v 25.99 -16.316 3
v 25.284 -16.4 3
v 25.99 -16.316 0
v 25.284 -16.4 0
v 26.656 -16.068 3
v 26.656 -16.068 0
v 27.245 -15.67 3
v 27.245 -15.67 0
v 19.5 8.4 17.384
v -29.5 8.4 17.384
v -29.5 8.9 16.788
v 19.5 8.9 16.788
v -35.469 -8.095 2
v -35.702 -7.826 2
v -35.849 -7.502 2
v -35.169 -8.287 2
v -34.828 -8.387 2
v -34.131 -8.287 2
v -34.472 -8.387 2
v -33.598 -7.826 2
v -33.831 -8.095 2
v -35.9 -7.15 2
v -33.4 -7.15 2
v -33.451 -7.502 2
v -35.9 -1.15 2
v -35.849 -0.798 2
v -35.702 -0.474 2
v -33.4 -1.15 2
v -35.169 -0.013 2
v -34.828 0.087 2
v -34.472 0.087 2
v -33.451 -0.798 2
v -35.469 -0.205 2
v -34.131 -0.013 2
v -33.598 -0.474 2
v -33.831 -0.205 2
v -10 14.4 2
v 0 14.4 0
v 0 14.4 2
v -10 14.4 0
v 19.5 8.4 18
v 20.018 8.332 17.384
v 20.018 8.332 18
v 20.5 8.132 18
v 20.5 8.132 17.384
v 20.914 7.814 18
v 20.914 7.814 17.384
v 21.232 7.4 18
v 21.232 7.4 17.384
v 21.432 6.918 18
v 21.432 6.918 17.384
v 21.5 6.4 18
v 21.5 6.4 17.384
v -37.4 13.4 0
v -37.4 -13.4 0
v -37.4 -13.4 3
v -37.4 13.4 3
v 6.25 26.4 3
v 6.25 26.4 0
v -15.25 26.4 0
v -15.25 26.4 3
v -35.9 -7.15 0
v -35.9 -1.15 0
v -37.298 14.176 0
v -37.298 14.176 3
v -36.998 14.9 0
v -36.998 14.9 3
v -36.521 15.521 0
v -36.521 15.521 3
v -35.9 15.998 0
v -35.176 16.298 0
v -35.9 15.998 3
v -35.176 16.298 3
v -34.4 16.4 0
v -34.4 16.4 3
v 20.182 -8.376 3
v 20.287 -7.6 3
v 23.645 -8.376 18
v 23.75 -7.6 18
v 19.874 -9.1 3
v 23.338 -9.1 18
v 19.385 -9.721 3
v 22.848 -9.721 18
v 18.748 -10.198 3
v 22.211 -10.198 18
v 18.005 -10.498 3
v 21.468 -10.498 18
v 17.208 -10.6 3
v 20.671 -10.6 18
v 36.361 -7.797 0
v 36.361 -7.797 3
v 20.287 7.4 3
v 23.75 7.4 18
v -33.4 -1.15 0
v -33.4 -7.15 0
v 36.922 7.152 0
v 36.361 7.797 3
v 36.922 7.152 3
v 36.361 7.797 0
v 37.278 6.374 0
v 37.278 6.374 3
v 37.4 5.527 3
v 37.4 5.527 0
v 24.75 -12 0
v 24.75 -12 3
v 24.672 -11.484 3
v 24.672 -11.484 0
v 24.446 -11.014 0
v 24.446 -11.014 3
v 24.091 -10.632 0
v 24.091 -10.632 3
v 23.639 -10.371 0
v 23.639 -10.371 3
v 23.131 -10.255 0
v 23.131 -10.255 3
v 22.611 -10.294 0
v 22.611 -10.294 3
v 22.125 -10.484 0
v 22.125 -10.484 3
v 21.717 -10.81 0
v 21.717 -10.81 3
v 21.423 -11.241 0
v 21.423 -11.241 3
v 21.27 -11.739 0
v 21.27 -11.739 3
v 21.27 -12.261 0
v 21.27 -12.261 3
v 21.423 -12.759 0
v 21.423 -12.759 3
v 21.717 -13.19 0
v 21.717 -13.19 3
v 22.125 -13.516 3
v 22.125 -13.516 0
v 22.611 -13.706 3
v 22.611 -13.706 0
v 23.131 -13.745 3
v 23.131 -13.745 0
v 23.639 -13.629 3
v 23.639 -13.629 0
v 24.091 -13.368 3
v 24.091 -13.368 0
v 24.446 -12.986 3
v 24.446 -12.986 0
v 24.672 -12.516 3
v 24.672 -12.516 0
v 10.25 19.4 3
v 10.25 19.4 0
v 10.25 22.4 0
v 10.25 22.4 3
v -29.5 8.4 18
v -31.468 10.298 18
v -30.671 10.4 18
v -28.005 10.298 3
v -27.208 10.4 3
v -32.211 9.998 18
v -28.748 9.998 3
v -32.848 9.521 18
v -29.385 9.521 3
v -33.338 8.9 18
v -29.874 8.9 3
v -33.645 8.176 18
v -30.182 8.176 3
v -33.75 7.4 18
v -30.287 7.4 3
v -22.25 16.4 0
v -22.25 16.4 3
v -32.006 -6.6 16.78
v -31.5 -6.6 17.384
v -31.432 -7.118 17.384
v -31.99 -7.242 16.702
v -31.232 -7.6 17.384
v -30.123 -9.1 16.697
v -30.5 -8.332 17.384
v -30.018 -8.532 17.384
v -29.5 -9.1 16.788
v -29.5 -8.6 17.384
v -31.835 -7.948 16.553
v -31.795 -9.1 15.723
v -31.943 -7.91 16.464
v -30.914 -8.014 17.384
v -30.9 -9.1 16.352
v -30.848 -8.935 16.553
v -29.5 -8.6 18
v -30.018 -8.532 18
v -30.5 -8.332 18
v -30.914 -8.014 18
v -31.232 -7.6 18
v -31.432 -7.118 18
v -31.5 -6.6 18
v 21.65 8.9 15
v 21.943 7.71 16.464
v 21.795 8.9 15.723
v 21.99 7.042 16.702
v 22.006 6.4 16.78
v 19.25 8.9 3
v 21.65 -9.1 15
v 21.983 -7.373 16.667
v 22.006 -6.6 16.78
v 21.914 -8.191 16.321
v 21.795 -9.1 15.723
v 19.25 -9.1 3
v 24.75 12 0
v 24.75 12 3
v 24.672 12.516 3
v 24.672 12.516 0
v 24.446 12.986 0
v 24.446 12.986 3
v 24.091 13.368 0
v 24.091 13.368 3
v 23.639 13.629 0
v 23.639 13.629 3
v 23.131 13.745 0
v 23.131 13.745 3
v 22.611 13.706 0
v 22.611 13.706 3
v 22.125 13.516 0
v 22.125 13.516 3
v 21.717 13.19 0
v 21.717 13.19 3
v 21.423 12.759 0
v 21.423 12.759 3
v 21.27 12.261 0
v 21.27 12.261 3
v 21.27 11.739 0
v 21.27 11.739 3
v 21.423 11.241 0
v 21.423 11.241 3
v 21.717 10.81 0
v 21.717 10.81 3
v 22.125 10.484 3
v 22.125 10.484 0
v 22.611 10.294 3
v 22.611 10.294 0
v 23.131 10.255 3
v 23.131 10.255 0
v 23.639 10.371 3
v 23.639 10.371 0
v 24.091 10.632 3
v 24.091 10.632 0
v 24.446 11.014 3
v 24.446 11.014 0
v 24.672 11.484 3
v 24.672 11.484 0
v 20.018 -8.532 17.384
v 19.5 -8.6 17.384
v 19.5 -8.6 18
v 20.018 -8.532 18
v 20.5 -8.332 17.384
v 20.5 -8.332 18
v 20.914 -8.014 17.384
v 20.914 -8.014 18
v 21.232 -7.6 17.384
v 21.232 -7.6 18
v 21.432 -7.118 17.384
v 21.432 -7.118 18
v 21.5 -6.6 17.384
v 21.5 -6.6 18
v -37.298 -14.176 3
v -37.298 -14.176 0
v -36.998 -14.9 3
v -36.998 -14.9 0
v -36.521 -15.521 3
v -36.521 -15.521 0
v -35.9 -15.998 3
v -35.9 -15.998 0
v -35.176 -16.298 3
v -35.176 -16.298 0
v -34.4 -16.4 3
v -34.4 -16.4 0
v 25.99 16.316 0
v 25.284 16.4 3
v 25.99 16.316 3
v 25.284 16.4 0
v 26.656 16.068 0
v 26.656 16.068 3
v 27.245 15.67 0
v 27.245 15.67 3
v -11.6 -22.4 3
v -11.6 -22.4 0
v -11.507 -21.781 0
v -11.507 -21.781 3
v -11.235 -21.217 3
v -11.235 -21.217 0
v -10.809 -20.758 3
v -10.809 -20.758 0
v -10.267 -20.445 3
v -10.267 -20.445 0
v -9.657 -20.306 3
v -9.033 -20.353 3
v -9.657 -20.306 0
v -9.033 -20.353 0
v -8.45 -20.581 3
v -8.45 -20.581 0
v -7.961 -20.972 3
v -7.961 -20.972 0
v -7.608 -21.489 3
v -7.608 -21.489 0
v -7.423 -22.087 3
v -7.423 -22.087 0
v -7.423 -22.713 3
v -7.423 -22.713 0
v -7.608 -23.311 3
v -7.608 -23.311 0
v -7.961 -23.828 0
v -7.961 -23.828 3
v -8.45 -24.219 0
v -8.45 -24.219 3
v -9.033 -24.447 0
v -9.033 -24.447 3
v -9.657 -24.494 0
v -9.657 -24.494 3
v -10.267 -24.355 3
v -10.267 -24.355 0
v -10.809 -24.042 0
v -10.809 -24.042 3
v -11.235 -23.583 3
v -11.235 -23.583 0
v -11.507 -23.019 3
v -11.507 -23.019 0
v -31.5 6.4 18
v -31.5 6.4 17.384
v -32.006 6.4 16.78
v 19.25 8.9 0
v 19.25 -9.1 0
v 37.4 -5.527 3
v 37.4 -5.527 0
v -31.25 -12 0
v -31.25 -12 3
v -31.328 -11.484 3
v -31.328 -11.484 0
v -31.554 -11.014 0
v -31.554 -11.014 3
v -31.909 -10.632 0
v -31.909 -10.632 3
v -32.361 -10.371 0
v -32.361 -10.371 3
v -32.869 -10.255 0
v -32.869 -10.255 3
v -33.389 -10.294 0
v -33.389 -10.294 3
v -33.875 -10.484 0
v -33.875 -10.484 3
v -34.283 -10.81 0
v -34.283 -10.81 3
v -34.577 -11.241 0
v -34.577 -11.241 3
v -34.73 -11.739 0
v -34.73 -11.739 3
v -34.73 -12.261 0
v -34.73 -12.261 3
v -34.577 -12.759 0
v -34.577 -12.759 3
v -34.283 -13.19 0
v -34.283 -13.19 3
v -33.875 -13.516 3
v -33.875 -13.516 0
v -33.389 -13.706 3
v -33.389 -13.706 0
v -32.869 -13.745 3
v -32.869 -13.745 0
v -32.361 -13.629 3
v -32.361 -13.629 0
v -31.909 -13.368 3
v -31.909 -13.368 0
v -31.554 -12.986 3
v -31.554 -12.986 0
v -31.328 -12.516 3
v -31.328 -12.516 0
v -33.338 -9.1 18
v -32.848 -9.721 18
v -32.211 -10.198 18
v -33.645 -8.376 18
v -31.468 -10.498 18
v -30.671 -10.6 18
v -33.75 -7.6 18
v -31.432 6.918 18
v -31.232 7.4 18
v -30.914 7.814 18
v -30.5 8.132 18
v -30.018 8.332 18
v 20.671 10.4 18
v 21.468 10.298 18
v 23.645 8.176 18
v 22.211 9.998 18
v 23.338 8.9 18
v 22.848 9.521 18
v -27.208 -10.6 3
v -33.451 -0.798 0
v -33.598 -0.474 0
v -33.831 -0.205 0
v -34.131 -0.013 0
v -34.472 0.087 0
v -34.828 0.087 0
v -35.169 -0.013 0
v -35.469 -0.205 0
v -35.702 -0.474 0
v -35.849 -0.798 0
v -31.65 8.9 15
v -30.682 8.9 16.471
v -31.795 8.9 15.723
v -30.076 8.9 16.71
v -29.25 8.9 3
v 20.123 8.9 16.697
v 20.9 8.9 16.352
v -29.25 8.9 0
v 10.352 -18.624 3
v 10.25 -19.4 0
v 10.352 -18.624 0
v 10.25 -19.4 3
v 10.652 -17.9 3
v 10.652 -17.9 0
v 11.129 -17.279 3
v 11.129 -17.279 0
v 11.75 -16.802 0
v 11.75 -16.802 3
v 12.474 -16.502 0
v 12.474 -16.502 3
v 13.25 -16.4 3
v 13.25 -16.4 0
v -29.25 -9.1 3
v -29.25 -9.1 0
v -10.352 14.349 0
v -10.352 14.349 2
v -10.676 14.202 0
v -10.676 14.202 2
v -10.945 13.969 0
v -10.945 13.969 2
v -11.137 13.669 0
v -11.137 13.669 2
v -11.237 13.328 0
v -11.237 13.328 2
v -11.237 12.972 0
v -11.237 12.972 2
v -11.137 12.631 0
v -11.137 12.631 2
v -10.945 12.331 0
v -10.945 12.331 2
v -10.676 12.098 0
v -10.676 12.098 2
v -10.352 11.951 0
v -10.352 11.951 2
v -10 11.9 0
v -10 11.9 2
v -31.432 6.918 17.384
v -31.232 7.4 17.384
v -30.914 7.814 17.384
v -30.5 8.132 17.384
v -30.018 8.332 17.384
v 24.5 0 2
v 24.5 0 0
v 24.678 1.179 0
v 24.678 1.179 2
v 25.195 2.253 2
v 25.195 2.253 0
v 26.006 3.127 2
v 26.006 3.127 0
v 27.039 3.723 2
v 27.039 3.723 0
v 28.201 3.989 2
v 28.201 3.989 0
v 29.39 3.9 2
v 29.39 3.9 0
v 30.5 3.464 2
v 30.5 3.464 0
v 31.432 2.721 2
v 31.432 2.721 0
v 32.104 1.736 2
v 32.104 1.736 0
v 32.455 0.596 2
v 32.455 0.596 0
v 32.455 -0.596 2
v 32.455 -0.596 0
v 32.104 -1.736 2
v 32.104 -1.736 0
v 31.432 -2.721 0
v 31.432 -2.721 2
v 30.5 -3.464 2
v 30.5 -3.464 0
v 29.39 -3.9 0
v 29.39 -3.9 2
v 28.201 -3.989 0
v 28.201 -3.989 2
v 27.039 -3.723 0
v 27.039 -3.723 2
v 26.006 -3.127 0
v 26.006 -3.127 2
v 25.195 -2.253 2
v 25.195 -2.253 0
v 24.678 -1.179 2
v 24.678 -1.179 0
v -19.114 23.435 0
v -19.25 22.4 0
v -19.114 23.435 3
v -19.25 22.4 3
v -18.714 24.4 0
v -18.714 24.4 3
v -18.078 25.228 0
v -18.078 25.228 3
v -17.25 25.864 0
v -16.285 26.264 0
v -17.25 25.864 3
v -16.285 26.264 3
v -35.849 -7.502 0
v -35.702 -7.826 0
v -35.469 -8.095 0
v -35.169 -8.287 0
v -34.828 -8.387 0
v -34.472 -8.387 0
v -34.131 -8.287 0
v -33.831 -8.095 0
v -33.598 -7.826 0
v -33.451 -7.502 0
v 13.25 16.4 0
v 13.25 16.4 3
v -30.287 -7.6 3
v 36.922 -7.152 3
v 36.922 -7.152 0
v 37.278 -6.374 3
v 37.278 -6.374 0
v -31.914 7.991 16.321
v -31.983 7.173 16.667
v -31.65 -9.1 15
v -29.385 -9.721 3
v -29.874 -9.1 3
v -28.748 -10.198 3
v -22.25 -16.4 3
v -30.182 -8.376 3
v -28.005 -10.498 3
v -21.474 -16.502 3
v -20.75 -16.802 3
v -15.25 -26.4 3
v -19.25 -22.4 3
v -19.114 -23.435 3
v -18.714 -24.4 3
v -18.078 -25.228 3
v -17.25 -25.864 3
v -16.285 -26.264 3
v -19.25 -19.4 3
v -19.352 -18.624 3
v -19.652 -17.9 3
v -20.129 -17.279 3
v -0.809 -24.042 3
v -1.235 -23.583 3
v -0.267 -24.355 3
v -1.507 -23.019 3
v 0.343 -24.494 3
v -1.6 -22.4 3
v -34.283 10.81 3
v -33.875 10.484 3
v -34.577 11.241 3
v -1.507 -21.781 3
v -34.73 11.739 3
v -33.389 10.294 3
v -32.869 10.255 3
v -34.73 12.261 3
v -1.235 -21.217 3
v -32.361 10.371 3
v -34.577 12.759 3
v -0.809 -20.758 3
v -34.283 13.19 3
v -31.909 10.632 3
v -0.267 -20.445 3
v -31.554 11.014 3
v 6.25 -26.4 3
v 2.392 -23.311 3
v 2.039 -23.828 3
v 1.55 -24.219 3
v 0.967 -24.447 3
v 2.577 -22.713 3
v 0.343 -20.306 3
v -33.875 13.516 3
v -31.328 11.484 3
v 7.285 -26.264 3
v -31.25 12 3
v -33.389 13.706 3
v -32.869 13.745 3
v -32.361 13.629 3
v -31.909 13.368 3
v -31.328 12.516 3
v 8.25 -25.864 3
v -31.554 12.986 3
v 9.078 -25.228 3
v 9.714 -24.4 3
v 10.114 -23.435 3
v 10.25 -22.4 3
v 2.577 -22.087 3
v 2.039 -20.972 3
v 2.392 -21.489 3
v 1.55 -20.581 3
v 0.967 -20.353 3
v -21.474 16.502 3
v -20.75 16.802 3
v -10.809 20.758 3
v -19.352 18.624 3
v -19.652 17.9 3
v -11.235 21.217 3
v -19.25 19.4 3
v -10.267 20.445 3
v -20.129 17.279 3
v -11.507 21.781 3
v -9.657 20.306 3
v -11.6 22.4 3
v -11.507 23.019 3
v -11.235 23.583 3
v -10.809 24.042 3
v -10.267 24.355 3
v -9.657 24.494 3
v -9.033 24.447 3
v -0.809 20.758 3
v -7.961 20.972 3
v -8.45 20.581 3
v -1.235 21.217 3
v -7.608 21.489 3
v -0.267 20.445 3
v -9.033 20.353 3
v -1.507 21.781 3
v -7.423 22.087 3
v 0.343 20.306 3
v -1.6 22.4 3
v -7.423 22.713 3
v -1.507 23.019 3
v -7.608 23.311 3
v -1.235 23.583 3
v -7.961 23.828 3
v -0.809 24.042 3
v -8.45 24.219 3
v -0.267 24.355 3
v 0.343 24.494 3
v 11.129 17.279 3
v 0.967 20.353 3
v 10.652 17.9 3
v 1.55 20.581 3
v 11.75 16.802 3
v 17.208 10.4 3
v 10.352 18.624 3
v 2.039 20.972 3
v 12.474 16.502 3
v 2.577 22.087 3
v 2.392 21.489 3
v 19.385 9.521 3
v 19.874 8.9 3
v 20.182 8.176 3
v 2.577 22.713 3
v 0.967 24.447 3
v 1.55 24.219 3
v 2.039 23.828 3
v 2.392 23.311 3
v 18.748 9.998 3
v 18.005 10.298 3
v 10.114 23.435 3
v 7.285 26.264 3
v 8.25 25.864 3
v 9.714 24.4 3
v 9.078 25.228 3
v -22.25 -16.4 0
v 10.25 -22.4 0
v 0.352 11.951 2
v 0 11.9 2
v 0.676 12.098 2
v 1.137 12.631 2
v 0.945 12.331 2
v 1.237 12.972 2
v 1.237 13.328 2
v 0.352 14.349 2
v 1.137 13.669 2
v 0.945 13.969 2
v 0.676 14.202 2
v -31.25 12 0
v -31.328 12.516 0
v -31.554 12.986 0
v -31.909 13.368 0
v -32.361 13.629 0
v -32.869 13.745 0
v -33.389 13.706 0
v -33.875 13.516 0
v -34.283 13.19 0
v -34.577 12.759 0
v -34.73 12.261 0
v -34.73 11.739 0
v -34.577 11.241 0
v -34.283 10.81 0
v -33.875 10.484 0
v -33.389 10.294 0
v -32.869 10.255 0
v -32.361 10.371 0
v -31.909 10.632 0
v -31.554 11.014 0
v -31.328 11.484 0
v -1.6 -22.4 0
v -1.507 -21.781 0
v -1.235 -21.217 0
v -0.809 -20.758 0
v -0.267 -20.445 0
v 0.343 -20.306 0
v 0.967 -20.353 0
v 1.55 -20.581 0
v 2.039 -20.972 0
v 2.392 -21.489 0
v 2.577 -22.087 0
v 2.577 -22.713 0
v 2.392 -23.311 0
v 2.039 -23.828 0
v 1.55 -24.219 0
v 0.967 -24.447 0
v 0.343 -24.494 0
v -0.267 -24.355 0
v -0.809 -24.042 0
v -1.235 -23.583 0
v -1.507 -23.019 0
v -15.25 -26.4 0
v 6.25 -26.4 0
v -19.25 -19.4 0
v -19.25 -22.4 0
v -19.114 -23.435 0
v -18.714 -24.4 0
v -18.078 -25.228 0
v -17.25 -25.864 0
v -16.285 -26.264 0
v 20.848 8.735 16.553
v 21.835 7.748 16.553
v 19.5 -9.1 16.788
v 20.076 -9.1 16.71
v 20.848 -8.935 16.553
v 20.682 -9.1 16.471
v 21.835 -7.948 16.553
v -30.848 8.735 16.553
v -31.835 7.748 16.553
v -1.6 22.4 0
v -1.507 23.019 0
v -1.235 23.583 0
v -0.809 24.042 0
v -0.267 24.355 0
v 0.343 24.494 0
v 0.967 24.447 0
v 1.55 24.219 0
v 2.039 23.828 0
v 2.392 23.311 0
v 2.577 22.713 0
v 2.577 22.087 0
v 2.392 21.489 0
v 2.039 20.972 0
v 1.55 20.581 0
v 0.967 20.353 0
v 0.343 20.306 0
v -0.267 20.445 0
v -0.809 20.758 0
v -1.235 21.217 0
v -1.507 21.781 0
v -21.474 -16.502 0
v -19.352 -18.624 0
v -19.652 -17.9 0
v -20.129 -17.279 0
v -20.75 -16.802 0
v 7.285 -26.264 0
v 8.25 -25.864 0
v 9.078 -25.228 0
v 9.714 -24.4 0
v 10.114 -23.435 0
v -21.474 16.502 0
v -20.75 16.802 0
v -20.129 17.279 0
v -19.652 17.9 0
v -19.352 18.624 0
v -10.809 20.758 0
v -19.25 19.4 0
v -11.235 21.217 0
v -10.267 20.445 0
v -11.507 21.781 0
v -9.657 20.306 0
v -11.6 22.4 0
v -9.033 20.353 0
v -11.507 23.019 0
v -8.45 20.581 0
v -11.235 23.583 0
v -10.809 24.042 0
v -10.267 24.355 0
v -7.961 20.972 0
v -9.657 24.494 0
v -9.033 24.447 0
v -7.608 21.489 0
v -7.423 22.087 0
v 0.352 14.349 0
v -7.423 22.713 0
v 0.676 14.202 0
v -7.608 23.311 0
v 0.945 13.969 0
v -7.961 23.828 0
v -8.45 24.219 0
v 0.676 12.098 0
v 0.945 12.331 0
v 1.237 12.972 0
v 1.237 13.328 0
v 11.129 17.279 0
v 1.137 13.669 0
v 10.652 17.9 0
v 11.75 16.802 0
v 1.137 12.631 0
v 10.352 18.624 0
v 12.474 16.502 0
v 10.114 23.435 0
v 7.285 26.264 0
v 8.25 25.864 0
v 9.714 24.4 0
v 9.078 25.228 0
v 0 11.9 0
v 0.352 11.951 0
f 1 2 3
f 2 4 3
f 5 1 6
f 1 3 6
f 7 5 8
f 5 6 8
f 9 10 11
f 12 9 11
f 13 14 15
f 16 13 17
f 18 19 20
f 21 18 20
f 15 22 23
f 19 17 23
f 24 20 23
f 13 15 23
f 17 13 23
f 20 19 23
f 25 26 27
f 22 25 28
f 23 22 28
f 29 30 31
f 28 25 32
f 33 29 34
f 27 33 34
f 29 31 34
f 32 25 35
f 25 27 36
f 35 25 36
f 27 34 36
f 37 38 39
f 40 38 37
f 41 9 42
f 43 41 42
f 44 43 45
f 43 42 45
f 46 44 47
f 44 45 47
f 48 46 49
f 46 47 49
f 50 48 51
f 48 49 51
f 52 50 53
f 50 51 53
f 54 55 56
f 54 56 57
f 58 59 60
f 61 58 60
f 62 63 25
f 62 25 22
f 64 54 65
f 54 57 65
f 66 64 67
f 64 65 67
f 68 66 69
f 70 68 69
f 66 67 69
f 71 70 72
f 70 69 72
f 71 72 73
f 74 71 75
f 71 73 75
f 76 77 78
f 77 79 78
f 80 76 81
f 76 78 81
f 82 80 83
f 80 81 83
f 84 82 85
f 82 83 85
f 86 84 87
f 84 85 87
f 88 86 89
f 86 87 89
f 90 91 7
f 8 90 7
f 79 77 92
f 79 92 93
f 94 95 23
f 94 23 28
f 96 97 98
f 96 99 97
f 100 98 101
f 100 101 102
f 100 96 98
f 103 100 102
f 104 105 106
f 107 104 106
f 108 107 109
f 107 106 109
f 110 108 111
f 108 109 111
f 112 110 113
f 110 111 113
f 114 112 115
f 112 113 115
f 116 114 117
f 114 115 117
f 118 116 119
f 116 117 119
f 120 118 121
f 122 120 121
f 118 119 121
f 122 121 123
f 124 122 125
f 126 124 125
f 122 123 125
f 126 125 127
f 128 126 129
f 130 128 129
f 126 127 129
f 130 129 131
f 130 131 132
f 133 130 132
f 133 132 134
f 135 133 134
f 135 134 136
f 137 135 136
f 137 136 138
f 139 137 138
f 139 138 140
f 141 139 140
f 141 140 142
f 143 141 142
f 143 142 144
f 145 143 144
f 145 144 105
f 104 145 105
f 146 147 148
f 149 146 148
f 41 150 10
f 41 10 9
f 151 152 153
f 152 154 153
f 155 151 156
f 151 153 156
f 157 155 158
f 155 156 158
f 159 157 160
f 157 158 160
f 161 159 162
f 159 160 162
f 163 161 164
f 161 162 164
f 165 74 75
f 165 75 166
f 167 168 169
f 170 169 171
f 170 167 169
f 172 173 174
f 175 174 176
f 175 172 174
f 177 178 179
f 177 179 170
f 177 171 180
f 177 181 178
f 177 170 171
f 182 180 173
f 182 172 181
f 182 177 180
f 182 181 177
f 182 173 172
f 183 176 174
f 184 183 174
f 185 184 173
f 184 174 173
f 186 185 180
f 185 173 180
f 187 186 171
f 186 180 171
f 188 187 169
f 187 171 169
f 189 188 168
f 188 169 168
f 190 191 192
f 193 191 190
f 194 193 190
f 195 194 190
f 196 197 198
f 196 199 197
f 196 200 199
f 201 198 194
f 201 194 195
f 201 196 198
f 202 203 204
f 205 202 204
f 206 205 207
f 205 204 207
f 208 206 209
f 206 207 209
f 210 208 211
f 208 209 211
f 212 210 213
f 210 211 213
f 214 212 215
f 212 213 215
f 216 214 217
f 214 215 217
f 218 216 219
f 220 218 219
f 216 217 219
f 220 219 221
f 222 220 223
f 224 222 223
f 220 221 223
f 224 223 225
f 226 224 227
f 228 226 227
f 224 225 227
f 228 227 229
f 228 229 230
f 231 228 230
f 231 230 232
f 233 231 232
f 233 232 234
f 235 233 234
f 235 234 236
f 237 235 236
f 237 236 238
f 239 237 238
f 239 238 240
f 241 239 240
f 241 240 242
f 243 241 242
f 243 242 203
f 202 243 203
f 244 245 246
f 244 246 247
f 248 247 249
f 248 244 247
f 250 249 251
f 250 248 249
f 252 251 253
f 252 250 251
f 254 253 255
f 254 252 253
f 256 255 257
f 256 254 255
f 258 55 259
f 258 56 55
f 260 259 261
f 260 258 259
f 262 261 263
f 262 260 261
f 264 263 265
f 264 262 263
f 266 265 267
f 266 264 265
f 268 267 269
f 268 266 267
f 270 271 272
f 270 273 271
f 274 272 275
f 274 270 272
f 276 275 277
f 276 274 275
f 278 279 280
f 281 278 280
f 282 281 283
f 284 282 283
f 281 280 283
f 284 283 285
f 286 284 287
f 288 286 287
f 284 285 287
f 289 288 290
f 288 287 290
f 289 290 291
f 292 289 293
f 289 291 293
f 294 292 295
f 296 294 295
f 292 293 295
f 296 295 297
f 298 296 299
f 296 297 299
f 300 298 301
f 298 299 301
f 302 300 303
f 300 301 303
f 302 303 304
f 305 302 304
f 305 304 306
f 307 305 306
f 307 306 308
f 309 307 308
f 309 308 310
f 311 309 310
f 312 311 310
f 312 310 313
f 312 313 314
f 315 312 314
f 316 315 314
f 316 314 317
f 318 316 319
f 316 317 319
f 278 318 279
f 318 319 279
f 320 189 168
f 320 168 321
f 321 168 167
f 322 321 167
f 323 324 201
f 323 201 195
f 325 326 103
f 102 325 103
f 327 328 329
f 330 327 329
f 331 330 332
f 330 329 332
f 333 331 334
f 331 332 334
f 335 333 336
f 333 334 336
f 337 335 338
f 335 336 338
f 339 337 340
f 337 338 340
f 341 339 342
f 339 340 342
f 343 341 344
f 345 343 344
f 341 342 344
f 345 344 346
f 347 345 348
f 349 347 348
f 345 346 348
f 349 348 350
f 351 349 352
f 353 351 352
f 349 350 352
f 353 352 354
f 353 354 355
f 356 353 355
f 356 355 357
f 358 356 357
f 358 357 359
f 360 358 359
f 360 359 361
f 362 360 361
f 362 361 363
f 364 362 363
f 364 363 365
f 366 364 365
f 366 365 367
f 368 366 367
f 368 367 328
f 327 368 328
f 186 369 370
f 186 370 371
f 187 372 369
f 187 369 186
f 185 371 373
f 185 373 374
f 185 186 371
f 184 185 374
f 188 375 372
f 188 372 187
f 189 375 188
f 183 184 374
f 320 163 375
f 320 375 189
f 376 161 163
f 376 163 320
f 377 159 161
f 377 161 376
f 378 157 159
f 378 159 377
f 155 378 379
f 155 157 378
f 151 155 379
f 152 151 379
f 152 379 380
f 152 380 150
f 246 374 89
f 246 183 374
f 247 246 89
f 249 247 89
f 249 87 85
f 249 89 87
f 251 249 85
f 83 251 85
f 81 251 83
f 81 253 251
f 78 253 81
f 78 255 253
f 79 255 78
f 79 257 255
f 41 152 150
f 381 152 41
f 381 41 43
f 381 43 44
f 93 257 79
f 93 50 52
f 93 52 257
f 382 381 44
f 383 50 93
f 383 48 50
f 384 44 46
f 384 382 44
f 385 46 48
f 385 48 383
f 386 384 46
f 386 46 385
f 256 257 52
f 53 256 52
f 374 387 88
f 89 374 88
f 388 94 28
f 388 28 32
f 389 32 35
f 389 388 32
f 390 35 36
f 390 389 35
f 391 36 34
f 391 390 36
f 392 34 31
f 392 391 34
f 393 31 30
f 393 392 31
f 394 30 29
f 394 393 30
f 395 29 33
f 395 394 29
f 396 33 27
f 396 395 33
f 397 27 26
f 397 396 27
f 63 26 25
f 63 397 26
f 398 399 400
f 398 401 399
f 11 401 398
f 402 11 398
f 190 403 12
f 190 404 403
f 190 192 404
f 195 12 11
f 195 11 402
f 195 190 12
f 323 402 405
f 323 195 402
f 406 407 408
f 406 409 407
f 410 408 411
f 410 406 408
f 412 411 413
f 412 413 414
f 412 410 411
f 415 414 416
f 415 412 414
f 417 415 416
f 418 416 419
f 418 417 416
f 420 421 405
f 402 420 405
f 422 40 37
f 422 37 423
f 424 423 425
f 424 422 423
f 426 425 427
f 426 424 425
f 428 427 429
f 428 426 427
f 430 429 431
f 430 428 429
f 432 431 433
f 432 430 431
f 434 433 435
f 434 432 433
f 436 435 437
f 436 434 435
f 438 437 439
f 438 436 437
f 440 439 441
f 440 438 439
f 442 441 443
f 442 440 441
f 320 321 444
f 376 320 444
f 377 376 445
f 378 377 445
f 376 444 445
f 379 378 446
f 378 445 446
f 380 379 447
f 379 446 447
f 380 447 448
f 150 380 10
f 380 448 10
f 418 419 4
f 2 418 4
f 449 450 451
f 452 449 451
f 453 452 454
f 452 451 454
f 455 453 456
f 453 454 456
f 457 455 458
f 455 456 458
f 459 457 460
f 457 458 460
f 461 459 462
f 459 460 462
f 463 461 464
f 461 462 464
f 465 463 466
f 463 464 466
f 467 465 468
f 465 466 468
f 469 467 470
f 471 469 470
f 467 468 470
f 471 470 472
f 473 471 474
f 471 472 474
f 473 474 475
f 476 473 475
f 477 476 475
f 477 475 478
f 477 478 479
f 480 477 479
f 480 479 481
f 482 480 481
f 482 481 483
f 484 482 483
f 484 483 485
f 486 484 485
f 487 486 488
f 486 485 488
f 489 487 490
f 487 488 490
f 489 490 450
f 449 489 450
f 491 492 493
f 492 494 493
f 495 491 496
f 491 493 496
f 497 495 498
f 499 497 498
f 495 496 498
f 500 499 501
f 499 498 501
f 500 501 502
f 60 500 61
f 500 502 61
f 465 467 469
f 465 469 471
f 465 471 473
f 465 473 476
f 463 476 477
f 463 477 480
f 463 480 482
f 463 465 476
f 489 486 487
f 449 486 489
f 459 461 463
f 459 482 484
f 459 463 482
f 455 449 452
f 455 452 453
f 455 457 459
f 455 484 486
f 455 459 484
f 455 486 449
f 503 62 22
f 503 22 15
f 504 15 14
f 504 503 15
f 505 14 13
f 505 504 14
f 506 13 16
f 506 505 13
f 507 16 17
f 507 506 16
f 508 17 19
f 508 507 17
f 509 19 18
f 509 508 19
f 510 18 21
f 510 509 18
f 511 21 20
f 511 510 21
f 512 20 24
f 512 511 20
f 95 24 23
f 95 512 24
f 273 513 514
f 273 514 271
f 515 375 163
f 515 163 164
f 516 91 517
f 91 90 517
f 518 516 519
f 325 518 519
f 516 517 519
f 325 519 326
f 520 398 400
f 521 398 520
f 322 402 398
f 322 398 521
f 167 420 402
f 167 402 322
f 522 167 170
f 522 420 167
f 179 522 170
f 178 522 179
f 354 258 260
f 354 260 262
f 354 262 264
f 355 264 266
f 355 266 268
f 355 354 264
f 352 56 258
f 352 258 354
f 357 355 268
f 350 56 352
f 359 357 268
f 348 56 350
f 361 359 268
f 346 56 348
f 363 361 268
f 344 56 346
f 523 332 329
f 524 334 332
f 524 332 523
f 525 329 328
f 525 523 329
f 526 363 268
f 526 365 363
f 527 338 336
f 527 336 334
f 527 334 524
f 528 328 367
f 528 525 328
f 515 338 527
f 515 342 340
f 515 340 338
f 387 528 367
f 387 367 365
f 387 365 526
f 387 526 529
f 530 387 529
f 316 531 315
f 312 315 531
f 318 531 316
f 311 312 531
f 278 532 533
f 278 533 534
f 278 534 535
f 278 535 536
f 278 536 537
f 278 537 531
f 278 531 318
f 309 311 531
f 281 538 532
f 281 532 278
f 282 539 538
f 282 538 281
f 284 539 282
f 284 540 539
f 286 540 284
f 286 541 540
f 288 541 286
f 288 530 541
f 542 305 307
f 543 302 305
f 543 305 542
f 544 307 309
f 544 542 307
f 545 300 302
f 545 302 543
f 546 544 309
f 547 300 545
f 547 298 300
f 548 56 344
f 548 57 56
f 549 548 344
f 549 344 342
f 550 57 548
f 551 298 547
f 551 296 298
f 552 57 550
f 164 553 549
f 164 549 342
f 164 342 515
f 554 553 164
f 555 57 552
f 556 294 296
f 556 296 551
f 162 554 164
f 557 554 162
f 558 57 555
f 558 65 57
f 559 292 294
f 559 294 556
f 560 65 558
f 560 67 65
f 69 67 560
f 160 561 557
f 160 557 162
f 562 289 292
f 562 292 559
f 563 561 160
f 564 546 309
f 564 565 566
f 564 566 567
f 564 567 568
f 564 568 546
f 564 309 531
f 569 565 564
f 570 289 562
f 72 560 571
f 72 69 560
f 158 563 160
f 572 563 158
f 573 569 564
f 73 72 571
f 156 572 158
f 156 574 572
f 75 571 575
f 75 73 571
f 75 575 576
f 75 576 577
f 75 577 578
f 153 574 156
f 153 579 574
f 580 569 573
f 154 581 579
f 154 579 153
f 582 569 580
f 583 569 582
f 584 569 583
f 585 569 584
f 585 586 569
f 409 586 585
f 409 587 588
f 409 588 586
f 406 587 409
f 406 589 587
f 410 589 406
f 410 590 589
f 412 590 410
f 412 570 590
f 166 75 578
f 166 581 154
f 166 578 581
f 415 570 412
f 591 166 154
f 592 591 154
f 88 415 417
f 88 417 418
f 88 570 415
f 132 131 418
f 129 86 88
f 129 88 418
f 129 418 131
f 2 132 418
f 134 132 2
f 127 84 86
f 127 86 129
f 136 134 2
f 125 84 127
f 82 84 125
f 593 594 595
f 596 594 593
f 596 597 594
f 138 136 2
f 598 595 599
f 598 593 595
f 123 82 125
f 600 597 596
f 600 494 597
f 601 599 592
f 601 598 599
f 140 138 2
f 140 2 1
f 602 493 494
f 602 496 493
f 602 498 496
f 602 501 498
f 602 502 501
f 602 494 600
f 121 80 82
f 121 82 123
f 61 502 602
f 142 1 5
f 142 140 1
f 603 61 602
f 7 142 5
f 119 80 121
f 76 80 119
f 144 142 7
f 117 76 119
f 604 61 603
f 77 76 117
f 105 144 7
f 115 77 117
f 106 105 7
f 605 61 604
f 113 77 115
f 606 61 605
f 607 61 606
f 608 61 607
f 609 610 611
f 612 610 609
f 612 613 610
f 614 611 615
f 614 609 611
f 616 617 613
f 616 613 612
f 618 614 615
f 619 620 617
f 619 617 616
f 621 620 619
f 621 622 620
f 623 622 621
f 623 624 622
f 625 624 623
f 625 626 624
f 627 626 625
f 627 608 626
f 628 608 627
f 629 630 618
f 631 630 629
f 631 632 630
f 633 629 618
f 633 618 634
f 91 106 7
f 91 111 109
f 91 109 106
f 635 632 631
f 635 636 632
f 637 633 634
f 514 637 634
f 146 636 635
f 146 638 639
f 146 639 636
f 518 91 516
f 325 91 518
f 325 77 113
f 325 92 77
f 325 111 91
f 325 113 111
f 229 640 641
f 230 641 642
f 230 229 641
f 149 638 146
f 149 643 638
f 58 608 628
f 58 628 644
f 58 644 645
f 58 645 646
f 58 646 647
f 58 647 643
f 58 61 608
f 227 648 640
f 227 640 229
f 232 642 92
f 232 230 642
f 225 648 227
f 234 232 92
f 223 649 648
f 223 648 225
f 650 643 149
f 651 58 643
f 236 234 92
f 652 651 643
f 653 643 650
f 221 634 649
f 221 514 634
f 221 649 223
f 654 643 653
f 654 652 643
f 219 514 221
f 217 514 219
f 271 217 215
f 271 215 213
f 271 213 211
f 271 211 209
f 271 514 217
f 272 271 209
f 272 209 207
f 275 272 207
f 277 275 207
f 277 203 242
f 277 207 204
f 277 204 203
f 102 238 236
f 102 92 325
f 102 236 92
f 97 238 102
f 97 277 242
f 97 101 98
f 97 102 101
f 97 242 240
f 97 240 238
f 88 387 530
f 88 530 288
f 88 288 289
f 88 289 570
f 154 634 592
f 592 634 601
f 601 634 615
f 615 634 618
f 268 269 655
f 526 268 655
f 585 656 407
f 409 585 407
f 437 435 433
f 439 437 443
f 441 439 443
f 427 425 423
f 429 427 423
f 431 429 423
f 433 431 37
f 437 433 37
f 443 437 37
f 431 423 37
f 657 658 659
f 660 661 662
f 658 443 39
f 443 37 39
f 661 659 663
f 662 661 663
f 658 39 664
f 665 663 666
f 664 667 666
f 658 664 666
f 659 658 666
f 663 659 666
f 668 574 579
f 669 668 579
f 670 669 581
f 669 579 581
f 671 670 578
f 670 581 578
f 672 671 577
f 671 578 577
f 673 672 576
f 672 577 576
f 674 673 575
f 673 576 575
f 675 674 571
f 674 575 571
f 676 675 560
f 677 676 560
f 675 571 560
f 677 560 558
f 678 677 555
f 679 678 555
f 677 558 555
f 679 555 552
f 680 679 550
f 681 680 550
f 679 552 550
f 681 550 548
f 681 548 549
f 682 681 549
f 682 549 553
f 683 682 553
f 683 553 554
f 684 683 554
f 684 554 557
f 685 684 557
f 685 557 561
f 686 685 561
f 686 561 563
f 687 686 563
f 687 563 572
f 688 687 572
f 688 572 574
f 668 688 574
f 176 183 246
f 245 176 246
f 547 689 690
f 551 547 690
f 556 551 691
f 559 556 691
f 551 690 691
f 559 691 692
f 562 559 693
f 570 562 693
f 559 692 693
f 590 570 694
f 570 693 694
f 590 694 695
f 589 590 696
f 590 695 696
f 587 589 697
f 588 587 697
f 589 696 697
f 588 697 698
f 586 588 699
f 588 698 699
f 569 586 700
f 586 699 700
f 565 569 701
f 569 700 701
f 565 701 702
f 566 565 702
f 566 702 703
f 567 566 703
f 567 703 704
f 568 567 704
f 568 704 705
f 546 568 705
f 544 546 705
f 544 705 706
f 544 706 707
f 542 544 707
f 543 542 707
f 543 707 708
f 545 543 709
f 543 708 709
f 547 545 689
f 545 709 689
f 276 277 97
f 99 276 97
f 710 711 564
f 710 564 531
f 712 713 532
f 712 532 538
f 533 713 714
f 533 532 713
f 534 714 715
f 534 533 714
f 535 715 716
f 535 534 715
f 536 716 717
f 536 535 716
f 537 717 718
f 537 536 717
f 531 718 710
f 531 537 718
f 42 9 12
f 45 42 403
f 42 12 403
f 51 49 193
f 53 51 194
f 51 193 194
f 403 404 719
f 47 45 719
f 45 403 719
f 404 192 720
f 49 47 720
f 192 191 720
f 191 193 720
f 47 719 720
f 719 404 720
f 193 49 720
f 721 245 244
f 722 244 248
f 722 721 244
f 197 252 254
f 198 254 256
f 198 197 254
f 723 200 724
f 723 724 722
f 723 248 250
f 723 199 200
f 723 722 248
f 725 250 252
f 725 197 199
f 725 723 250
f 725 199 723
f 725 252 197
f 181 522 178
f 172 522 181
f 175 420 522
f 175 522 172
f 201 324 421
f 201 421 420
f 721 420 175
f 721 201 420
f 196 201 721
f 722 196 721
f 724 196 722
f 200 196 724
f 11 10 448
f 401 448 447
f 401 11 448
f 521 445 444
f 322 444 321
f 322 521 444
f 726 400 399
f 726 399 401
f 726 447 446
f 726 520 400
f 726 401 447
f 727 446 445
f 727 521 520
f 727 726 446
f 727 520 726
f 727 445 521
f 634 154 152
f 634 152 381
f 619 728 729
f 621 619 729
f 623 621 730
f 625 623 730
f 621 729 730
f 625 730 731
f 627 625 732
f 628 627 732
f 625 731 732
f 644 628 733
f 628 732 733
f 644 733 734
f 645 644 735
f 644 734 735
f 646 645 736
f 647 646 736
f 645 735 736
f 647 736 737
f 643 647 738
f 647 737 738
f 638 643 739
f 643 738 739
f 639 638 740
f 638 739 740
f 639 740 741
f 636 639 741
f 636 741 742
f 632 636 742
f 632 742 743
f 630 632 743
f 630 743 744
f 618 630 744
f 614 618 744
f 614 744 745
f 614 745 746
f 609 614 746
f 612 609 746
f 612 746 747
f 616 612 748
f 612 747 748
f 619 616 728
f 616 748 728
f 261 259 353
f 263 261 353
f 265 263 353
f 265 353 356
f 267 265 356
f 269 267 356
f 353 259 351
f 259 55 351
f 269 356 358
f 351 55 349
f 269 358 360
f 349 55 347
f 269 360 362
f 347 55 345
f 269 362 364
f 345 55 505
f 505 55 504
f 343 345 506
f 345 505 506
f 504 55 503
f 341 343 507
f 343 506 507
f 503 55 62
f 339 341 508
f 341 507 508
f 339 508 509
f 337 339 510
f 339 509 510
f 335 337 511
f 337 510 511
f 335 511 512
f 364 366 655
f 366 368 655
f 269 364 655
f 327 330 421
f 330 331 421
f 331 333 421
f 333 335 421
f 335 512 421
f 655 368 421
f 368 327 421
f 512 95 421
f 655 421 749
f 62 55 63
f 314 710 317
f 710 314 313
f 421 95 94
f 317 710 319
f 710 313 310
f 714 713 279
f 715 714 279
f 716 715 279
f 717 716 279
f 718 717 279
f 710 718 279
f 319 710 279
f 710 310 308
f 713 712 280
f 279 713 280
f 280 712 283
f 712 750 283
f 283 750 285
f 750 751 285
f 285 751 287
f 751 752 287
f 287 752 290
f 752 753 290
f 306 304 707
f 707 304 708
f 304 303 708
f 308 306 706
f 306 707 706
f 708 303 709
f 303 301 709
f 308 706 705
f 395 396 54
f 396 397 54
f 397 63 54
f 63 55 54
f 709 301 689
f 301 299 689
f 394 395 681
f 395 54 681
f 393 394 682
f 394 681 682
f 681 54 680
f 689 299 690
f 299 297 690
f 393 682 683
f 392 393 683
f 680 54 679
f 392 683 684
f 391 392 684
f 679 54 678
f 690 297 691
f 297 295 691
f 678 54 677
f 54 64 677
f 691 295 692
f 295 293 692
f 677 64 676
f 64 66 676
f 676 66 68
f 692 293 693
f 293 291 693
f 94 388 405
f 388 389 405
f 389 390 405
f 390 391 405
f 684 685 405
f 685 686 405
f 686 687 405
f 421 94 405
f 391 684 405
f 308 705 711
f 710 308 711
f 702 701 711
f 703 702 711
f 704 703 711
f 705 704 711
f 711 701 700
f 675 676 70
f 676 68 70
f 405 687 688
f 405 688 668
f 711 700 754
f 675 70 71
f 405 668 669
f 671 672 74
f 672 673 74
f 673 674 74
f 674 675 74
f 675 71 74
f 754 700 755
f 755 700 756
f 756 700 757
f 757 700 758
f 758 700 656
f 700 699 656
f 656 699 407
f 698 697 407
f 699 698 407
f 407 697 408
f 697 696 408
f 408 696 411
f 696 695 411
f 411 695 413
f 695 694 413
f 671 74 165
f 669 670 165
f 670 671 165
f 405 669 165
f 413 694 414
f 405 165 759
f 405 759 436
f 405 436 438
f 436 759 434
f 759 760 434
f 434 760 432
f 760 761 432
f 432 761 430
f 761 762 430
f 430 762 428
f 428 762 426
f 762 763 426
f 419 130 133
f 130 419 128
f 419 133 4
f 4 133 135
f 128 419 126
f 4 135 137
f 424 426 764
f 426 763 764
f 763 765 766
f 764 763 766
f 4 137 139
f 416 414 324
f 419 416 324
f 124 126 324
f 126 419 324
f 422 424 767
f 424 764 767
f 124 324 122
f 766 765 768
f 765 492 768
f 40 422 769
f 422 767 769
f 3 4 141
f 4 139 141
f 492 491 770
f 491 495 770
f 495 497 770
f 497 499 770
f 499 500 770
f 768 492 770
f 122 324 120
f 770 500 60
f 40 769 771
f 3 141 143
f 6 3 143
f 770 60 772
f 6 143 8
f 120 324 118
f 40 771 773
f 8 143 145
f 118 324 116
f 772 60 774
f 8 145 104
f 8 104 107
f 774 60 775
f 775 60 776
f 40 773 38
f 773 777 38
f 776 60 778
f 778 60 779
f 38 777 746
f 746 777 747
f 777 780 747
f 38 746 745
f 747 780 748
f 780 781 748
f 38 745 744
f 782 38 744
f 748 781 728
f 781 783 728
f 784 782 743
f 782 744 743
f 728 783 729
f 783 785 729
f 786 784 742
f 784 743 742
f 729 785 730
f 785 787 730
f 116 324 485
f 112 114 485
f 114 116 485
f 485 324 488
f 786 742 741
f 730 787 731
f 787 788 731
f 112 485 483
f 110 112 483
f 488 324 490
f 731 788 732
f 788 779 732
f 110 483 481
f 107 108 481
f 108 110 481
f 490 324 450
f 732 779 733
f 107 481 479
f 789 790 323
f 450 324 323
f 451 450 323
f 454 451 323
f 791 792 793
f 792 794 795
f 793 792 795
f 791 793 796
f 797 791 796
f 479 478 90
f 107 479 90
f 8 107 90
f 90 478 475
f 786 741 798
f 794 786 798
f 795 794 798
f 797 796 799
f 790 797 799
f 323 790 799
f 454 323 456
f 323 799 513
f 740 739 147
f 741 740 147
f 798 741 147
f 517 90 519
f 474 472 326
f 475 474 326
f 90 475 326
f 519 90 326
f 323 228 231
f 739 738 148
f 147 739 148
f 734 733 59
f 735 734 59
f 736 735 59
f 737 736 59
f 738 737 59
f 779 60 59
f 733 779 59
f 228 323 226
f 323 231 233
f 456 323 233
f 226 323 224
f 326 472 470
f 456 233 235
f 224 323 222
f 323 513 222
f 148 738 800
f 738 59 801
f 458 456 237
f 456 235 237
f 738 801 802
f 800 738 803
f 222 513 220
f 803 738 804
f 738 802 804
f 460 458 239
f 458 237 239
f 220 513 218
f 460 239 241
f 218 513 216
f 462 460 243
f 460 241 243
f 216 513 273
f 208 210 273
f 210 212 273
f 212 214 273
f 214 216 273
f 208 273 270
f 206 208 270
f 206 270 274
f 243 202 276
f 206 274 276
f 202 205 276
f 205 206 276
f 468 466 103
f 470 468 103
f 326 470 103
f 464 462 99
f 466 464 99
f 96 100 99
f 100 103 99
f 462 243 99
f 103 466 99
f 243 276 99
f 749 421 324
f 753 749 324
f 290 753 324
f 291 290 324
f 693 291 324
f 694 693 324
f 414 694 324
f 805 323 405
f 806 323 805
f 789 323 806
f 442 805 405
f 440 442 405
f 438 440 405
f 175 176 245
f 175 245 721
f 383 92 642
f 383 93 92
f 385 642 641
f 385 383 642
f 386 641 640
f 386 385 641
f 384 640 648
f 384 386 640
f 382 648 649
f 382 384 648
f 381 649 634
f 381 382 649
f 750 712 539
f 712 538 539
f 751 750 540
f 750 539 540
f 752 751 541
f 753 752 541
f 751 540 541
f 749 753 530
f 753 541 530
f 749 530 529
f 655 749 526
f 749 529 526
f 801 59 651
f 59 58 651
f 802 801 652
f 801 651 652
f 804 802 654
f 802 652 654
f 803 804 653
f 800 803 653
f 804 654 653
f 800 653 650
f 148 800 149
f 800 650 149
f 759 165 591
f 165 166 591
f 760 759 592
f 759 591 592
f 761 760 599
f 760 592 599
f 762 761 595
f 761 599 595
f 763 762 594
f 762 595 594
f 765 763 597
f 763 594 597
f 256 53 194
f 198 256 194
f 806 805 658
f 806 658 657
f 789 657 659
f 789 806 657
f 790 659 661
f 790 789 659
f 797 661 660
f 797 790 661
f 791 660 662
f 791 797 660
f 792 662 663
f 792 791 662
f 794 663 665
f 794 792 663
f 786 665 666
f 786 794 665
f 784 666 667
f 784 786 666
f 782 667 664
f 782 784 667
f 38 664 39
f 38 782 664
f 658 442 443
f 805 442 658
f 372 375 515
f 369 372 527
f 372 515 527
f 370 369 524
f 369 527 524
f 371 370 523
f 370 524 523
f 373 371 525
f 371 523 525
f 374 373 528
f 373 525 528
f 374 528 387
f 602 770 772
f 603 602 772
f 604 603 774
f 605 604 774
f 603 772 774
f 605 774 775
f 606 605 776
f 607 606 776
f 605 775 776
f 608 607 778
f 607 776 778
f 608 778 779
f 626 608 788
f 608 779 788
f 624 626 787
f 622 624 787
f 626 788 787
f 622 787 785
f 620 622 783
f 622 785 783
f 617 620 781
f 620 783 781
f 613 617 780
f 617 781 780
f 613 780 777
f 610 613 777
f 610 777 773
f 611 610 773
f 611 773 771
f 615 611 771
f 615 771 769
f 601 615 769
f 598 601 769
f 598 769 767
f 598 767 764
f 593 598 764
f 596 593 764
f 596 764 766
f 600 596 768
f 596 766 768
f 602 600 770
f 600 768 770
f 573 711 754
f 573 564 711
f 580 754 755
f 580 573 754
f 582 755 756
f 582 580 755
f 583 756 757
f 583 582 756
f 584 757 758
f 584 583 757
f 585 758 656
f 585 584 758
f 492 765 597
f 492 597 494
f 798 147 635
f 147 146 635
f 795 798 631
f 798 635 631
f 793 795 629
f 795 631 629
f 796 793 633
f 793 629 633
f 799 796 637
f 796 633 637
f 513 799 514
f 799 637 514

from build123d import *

# Parameters (mm, degrees)
SKETCH1_W           = 74.8
SKETCH1_H           = 32.8
BOSS_EXTRUDE1_DEPTH = 3
CUT_EXTRUDE1_DEPTH  = 3
SKETCH3_R           = 1.75
CUT_EXTRUDE2_DEPTH  = 3
SKETCH4_W           = 48.5
SKETCH4_H           = 18
CUT_EXTRUDE3_DEPTH  = 3
SKETCH5_W           = 57.5
SKETCH5_H           = 21
SKETCH5_W_2         = 48.5
SKETCH5_H_2         = 18
BOSS_EXTRUDE3_DEPTH = 15
CUT_EXTRUDE11_START = -10.6
CUT_EXTRUDE11_DEPTH = 21
CHAMFER1_SIZE       = 15
CHAMFER1_SIZE2      = 3
CHAMFER2_SIZE       = 3
CHAMFER2_SIZE2      = 15
SKETCH18_W          = 54.5
SKETCH18_H          = 18
SKETCH18_W_2        = 53
SKETCH18_H_2        = 17
BOSS_EXTRUDE6_DEPTH = 3
SKETCH12_W          = 29.5
SKETCH12_H          = 10
BOSS_EXTRUDE5_DEPTH = 3
SKETCH13_R          = 2.1
CUT_EXTRUDE9_DEPTH  = 3
FILLET2_R           = 3
FILLET3_R           = 3
FILLET4_R           = 4
FILLET5_R           = 3
FILLET11_R          = 2
CHAMFER11_SIZE      = 2.383507185
CHAMFER11_SIZE_2    = 2
CUT_EXTRUDE12_DEPTH = 2
CUT_EXTRUDE13_DEPTH = 2
SKETCH21_R          = 4
CUT_EXTRUDE14_DEPTH = 2


# Read off the part's stored shape, not the designer's step: Cut-Extrude11
with BuildPart() as part:
    # Sketch1 → Boss-Extrude1 (new body)
    with BuildSketch(Plane.XY):
        Rectangle(SKETCH1_W, SKETCH1_H)
    extrude(amount=BOSS_EXTRUDE1_DEPTH)

    # Sketch2 → Cut-Extrude1 (cut)
    with BuildSketch(Plane.XY.offset(3)):
        Polygon((37.4, 16.4), (26.4, 16.4), (37.4, 6.9), align=None)
        Polygon((37.4, -16.4), (37.4, -6.9), (26.4, -16.4), align=None)
    extrude(amount=-CUT_EXTRUDE1_DEPTH, mode=Mode.SUBTRACT)

    # Sketch3 → Cut-Extrude2 (cut)
    with BuildSketch(Plane.XY.offset(3)):
        with Locations((-33, 12)):
            Circle(SKETCH3_R)
        with Locations((-33, -12)):
            Circle(SKETCH3_R)
        with Locations((23, -12)):
            Circle(SKETCH3_R)
        with Locations((23, 12)):
            Circle(SKETCH3_R)
    extrude(amount=-CUT_EXTRUDE2_DEPTH, mode=Mode.SUBTRACT)

    # Sketch4 → Cut-Extrude3 (cut)
    with BuildSketch(Plane.XY.offset(3)):
        with Locations((-5, -0.1)):
            Rectangle(SKETCH4_W, SKETCH4_H)
    extrude(amount=-CUT_EXTRUDE3_DEPTH, mode=Mode.SUBTRACT)

    # Sketch5 → Boss-Extrude3 (add)
    with BuildSketch(Plane.XY.offset(3)):
        with Locations((-5, -0.1)):
            Rectangle(SKETCH5_W, SKETCH5_H)
        with Locations((-5, -0.1)):
            Rectangle(SKETCH5_W_2, SKETCH5_H_2, mode=Mode.SUBTRACT)
    extrude(amount=BOSS_EXTRUDE3_DEPTH)

    # Cut-Extrude11 outline → Cut-Extrude11 (cut)
    with BuildSketch(Plane(origin=(0, 0, 0), x_dir=(1, 0, 0), z_dir=(0, 1, 0)).offset(CUT_EXTRUDE11_START)):
        Polygon((-33.75, -3), (-33.75, -18), (-30.286977133, -3), align=None)
        Polygon((23.75, -3), (20.286977133, -3), (23.75, -18), align=None)
    extrude(amount=CUT_EXTRUDE11_DEPTH, mode=Mode.SUBTRACT)

    # Chamfer1
    chamfer1_edges = [part.edges().sort_by_distance(p)[0] for p in [
        (19.25, -0.1, 18),
    ]]
    chamfer1_side = [part.faces().sort_by_distance(p)[0] for p in [
        (19.25, -0.1, 9),
    ]]
    chamfer(chamfer1_edges, length=CHAMFER1_SIZE, length2=CHAMFER1_SIZE2, reference=chamfer1_side[0])

    # Chamfer2
    chamfer2_edges = [part.edges().sort_by_distance(p)[0] for p in [
        (-29.25, -0.1, 18),
    ]]
    chamfer2_side = [part.faces().sort_by_distance(p)[0] for p in [
        (-3.5, 9.512147858, 18),
    ]]
    chamfer(chamfer2_edges, length=CHAMFER2_SIZE, length2=CHAMFER2_SIZE2, reference=chamfer2_side[0])

    # Sketch18 → Boss-Extrude6 (add)
    with BuildSketch(Plane.XY.offset(18)):
        with Locations((-5, -0.1)):
            Rectangle(SKETCH18_W, SKETCH18_H)
        with Locations((-5, -0.1)):
            Rectangle(SKETCH18_W_2, SKETCH18_H_2, mode=Mode.SUBTRACT)
    extrude(amount=-BOSS_EXTRUDE6_DEPTH)

    # Sketch12 → Boss-Extrude5 (add)
    with BuildSketch(Plane(origin=(0, 0, 0), x_dir=(-1, 0, 0), z_dir=(0, 0, -1))):
        with Locations((4.5, 21.4)):
            Rectangle(SKETCH12_W, SKETCH12_H)
        with Locations((4.5, -21.4)):
            Rectangle(SKETCH12_W, SKETCH12_H)
    extrude(amount=-BOSS_EXTRUDE5_DEPTH)

    # Sketch13 → Cut-Extrude9 (cut)
    with BuildSketch(Plane(origin=(0, 0, 0), x_dir=(-1, 0, 0), z_dir=(0, 0, -1))):
        with Locations((-0.5, 22.4)):
            Circle(SKETCH13_R)
        with Locations((9.5, 22.4)):
            Circle(SKETCH13_R)
        with Locations((-0.5, -22.4)):
            Circle(SKETCH13_R)
        with Locations((9.5, -22.4)):
            Circle(SKETCH13_R)
    extrude(amount=-CUT_EXTRUDE9_DEPTH, mode=Mode.SUBTRACT)

    # Fillet2
    fillet2_edges = [part.edges().sort_by_distance(p)[0] for p in [
        (22.018488567, 10.4, 10.5),
        (22.018488567, -10.6, 10.5),
        (-32.018488566, -10.6, 10.5),
        (-32.018488566, 10.4, 10.5),
    ]]
    fillet(fillet2_edges, radius=FILLET2_R)

    # Fillet3
    fillet3_edges = [part.edges().sort_by_distance(p)[0] for p in [
        (37.4, 6.9, 1.5),
        (26.4, 16.4, 1.5),
        (26.4, -16.4, 1.5),
        (37.4, -6.9, 1.5),
        (-37.4, -16.4, 1.5),
        (-37.4, 16.4, 1.5),
    ]]
    fillet(fillet3_edges, radius=FILLET3_R)

    # Fillet4
    fillet4_edges = [part.edges().sort_by_distance(p)[0] for p in [
        (-19.25, 26.4, 1.5),
        (10.25, 26.4, 1.5),
        (10.25, -26.4, 1.5),
        (-19.25, -26.4, 1.5),
    ]]
    fillet(fillet4_edges, radius=FILLET4_R)

    # Fillet5
    fillet5_edges = [part.edges().sort_by_distance(p)[0] for p in [
        (-19.25, 16.4, 1.5),
        (10.25, 16.4, 1.5),
        (10.25, -16.4, 1.5),
        (-19.25, -16.4, 1.5),
    ]]
    fillet(fillet5_edges, radius=FILLET5_R)

    # Fillet11
    fillet11_edges = [part.edges().sort_by_distance(p)[0] for p in [
        (21.5, 8.4, 16.5),
        (-31.5, 8.4, 16.5),
        (-31.5, -8.6, 16.5),
        (21.5, -8.6, 16.5),
    ]]
    fillet(fillet11_edges, radius=FILLET11_R)

    # Chamfer11
    # the kernel refuses this chamfer: 2.383507185, 2 mm, written as the material it takes off along each edge
    with BuildSketch(Plane(origin=(-31.5, -6.6, 15), x_dir=(0.024939322090233706, 0, 0.9996889667359941), z_dir=(0, 1, 0))) as chamfer11_piece_1_section:
        Polygon((CHAMFER11_SIZE * 0.999688966815, -CHAMFER11_SIZE * 0.0249393220922), (-CHAMFER11_SIZE_2 * 0.0249393220902, -CHAMFER11_SIZE_2 * 0.999688966736), (0, 0), align=None)
    chamfer11_piece_1 = extrude(amount=13, mode=Mode.PRIVATE)
    chamfer11_piece_1 = split(chamfer11_piece_1, bisect_by=Plane(origin=(-31.892473609, -0.1, 16.212368046), z_dir=(0.9805806756909202, 0, 0.196116135138184)), keep=Keep.TOP, mode=Mode.PRIVATE)
    add(chamfer11_piece_1, mode=Mode.SUBTRACT)
    with BuildSketch(Plane(origin=(19.5, -8.6, 15), x_dir=(0, 0.024939322090234427, 0.9996889667359941), z_dir=(-1, 0, 0))) as chamfer11_piece_2_section:
        Polygon((CHAMFER11_SIZE * 0.999688966815, -CHAMFER11_SIZE * 0.0249393220922), (-CHAMFER11_SIZE_2 * 0.0249393220902, -CHAMFER11_SIZE_2 * 0.999688966736), (0, 0), align=None)
    chamfer11_piece_2 = extrude(amount=49, mode=Mode.PRIVATE)
    chamfer11_piece_2 = split(chamfer11_piece_2, bisect_by=Plane(origin=(-5, -9.1, 16.074399324), z_dir=(0, 1, 0)), keep=Keep.TOP, mode=Mode.PRIVATE)
    add(chamfer11_piece_2, mode=Mode.SUBTRACT)
    with BuildSketch(Plane(origin=(-29.5, 8.4, 15), x_dir=(0, -0.024939322090234427, 0.9996889667359941), z_dir=(1, 0, 0))) as chamfer11_piece_3_section:
        Polygon((CHAMFER11_SIZE * 0.999688966815, -CHAMFER11_SIZE * 0.0249393220922), (-CHAMFER11_SIZE_2 * 0.0249393220902, -CHAMFER11_SIZE_2 * 0.999688966736), (0, 0), align=None)
    chamfer11_piece_3 = extrude(amount=49, mode=Mode.PRIVATE)
    chamfer11_piece_3 = split(chamfer11_piece_3, bisect_by=Plane(origin=(-5, 8.9, 16.074399324), z_dir=(0, -1, 0)), keep=Keep.TOP, mode=Mode.PRIVATE)
    add(chamfer11_piece_3, mode=Mode.SUBTRACT)
    with BuildSketch(Plane(origin=(21.5, 6.4, 15), x_dir=(-0.024939322090233706, 0, 0.9996889667359941), z_dir=(0, -1, 0))) as chamfer11_piece_4_section:
        Polygon((CHAMFER11_SIZE * 0.999688966815, -CHAMFER11_SIZE * 0.0249393220922), (-CHAMFER11_SIZE_2 * 0.0249393220902, -CHAMFER11_SIZE_2 * 0.999688966736), (0, 0), align=None)
    chamfer11_piece_4 = extrude(amount=13, mode=Mode.PRIVATE)
    chamfer11_piece_4 = split(chamfer11_piece_4, bisect_by=Plane(origin=(21.892473609, -0.1, 16.212368046), z_dir=(-0.9805806756909202, 0, 0.19611613513818402)), keep=Keep.TOP, mode=Mode.PRIVATE)
    add(chamfer11_piece_4, mode=Mode.SUBTRACT)
    with BuildSketch(Plane(origin=(-29.5, -6.6, 15), x_dir=(-1, 0, 0), z_dir=(0, 1, 0))) as chamfer11_piece_5_section:
        Polygon((2, CHAMFER11_SIZE), (2 + CHAMFER11_SIZE_2, 0), (2, 0), align=None)
    chamfer11_piece_5 = revolve(axis=Axis((-29.5, -6.6, 15), (0, 0, 1)), revolution_arc=90, mode=Mode.PRIVATE)
    chamfer11_piece_5 = split(chamfer11_piece_5, bisect_by=Plane(origin=(-31.818510416, -8.221304707, 15.842552081), z_dir=(0.9805806756909202, 0, 0.196116135138184)), keep=Keep.TOP, mode=Mode.PRIVATE)
    chamfer11_piece_5 = split(chamfer11_piece_5, bisect_by=Plane(origin=(-30.957610473, -9.1, 16.014732069), z_dir=(0, 1, 0)), keep=Keep.TOP, mode=Mode.PRIVATE)
    add(chamfer11_piece_5, mode=Mode.SUBTRACT)
    with BuildSketch(Plane(origin=(19.5, -6.6, 15), x_dir=(0, -1, 0), z_dir=(-1, 0, 0))) as chamfer11_piece_6_section:
        Polygon((2, CHAMFER11_SIZE), (2 + CHAMFER11_SIZE_2, 0), (2, 0), align=None)
    chamfer11_piece_6 = revolve(axis=Axis((19.5, -6.6, 15), (0, 0, 1)), revolution_arc=90, mode=Mode.PRIVATE)
    chamfer11_piece_6 = split(chamfer11_piece_6, bisect_by=Plane(origin=(21.818510413, -8.221304708, 15.842552067), z_dir=(-0.9805806756909202, 0, 0.19611613513818402)), keep=Keep.TOP, mode=Mode.PRIVATE)
    chamfer11_piece_6 = split(chamfer11_piece_6, bisect_by=Plane(origin=(20.957610477, -9.1, 16.014732055), z_dir=(0, 1, 0)), keep=Keep.TOP, mode=Mode.PRIVATE)
    add(chamfer11_piece_6, mode=Mode.SUBTRACT)
    with BuildSketch(Plane(origin=(-29.5, 6.4, 15), x_dir=(0, 1, 0), z_dir=(1, 0, 0))) as chamfer11_piece_7_section:
        Polygon((2, CHAMFER11_SIZE), (2 + CHAMFER11_SIZE_2, 0), (2, 0), align=None)
    chamfer11_piece_7 = revolve(axis=Axis((-29.5, 6.4, 15), (0, 0, 1)), revolution_arc=90, mode=Mode.PRIVATE)
    chamfer11_piece_7 = split(chamfer11_piece_7, bisect_by=Plane(origin=(-30.957610477, 8.9, 16.014732055), z_dir=(0, -1, 0)), keep=Keep.TOP, mode=Mode.PRIVATE)
    chamfer11_piece_7 = split(chamfer11_piece_7, bisect_by=Plane(origin=(-31.818510413, 8.021304708, 15.842552067), z_dir=(0.9805806756909202, 0, 0.196116135138184)), keep=Keep.TOP, mode=Mode.PRIVATE)
    add(chamfer11_piece_7, mode=Mode.SUBTRACT)
    with BuildSketch(Plane(origin=(19.5, 6.4, 15), x_dir=(0, 1, 0), z_dir=(-1, 0, 0))) as chamfer11_piece_8_section:
        Polygon((2, -CHAMFER11_SIZE), (2 + CHAMFER11_SIZE_2, 0), (2, 0), align=None)
    chamfer11_piece_8 = revolve(axis=Axis((19.5, 6.4, 15), (0, 0, -1)), revolution_arc=90, mode=Mode.PRIVATE)
    chamfer11_piece_8 = split(chamfer11_piece_8, bisect_by=Plane(origin=(21.818510414, 8.021304708, 15.842552069), z_dir=(-0.9805806756909202, 0, 0.19611613513818402)), keep=Keep.TOP, mode=Mode.PRIVATE)
    chamfer11_piece_8 = split(chamfer11_piece_8, bisect_by=Plane(origin=(20.957610476, 8.9, 16.014732056), z_dir=(0, -1, 0)), keep=Keep.TOP, mode=Mode.PRIVATE)
    add(chamfer11_piece_8, mode=Mode.SUBTRACT)

    # Sketch19 → Cut-Extrude12 (cut)
    with BuildSketch(Plane(origin=(0, 0, 0), x_dir=(-1, 0, 0), z_dir=(0, 0, -1))):
        with BuildLine():
            Line((0, 14.4), (10, 14.4))
            ThreePointArc((10, 14.4), (11.25, 13.15), (10, 11.9))
            Line((10, 11.9), (0, 11.9))
            ThreePointArc((0, 11.9), (-1.25, 13.15), (0, 14.4))
        make_face()
    extrude(amount=-CUT_EXTRUDE12_DEPTH, mode=Mode.SUBTRACT)

    # Sketch20 → Cut-Extrude13 (cut)
    with BuildSketch(Plane(origin=(0, 0, 0), x_dir=(-1, 0, 0), z_dir=(0, 0, -1))):
        with BuildLine():
            Line((35.9, -1.15), (35.9, -7.15))
            ThreePointArc((35.9, -7.15), (34.65, -8.4), (33.4, -7.15))
            Line((33.4, -7.15), (33.4, -1.15))
            ThreePointArc((33.4, -1.15), (34.65, 0.1), (35.9, -1.15))
        make_face()
    extrude(amount=-CUT_EXTRUDE13_DEPTH, mode=Mode.SUBTRACT)

    # Sketch21 → Cut-Extrude14 (cut)
    with BuildSketch(Plane(origin=(0, 0, 0), x_dir=(-1, 0, 0), z_dir=(0, 0, -1))):
        with Locations((-28.5, 0)):
            Circle(SKETCH21_R)
    extrude(amount=-CUT_EXTRUDE14_DEPTH, mode=Mode.SUBTRACT)


solid = part.part
